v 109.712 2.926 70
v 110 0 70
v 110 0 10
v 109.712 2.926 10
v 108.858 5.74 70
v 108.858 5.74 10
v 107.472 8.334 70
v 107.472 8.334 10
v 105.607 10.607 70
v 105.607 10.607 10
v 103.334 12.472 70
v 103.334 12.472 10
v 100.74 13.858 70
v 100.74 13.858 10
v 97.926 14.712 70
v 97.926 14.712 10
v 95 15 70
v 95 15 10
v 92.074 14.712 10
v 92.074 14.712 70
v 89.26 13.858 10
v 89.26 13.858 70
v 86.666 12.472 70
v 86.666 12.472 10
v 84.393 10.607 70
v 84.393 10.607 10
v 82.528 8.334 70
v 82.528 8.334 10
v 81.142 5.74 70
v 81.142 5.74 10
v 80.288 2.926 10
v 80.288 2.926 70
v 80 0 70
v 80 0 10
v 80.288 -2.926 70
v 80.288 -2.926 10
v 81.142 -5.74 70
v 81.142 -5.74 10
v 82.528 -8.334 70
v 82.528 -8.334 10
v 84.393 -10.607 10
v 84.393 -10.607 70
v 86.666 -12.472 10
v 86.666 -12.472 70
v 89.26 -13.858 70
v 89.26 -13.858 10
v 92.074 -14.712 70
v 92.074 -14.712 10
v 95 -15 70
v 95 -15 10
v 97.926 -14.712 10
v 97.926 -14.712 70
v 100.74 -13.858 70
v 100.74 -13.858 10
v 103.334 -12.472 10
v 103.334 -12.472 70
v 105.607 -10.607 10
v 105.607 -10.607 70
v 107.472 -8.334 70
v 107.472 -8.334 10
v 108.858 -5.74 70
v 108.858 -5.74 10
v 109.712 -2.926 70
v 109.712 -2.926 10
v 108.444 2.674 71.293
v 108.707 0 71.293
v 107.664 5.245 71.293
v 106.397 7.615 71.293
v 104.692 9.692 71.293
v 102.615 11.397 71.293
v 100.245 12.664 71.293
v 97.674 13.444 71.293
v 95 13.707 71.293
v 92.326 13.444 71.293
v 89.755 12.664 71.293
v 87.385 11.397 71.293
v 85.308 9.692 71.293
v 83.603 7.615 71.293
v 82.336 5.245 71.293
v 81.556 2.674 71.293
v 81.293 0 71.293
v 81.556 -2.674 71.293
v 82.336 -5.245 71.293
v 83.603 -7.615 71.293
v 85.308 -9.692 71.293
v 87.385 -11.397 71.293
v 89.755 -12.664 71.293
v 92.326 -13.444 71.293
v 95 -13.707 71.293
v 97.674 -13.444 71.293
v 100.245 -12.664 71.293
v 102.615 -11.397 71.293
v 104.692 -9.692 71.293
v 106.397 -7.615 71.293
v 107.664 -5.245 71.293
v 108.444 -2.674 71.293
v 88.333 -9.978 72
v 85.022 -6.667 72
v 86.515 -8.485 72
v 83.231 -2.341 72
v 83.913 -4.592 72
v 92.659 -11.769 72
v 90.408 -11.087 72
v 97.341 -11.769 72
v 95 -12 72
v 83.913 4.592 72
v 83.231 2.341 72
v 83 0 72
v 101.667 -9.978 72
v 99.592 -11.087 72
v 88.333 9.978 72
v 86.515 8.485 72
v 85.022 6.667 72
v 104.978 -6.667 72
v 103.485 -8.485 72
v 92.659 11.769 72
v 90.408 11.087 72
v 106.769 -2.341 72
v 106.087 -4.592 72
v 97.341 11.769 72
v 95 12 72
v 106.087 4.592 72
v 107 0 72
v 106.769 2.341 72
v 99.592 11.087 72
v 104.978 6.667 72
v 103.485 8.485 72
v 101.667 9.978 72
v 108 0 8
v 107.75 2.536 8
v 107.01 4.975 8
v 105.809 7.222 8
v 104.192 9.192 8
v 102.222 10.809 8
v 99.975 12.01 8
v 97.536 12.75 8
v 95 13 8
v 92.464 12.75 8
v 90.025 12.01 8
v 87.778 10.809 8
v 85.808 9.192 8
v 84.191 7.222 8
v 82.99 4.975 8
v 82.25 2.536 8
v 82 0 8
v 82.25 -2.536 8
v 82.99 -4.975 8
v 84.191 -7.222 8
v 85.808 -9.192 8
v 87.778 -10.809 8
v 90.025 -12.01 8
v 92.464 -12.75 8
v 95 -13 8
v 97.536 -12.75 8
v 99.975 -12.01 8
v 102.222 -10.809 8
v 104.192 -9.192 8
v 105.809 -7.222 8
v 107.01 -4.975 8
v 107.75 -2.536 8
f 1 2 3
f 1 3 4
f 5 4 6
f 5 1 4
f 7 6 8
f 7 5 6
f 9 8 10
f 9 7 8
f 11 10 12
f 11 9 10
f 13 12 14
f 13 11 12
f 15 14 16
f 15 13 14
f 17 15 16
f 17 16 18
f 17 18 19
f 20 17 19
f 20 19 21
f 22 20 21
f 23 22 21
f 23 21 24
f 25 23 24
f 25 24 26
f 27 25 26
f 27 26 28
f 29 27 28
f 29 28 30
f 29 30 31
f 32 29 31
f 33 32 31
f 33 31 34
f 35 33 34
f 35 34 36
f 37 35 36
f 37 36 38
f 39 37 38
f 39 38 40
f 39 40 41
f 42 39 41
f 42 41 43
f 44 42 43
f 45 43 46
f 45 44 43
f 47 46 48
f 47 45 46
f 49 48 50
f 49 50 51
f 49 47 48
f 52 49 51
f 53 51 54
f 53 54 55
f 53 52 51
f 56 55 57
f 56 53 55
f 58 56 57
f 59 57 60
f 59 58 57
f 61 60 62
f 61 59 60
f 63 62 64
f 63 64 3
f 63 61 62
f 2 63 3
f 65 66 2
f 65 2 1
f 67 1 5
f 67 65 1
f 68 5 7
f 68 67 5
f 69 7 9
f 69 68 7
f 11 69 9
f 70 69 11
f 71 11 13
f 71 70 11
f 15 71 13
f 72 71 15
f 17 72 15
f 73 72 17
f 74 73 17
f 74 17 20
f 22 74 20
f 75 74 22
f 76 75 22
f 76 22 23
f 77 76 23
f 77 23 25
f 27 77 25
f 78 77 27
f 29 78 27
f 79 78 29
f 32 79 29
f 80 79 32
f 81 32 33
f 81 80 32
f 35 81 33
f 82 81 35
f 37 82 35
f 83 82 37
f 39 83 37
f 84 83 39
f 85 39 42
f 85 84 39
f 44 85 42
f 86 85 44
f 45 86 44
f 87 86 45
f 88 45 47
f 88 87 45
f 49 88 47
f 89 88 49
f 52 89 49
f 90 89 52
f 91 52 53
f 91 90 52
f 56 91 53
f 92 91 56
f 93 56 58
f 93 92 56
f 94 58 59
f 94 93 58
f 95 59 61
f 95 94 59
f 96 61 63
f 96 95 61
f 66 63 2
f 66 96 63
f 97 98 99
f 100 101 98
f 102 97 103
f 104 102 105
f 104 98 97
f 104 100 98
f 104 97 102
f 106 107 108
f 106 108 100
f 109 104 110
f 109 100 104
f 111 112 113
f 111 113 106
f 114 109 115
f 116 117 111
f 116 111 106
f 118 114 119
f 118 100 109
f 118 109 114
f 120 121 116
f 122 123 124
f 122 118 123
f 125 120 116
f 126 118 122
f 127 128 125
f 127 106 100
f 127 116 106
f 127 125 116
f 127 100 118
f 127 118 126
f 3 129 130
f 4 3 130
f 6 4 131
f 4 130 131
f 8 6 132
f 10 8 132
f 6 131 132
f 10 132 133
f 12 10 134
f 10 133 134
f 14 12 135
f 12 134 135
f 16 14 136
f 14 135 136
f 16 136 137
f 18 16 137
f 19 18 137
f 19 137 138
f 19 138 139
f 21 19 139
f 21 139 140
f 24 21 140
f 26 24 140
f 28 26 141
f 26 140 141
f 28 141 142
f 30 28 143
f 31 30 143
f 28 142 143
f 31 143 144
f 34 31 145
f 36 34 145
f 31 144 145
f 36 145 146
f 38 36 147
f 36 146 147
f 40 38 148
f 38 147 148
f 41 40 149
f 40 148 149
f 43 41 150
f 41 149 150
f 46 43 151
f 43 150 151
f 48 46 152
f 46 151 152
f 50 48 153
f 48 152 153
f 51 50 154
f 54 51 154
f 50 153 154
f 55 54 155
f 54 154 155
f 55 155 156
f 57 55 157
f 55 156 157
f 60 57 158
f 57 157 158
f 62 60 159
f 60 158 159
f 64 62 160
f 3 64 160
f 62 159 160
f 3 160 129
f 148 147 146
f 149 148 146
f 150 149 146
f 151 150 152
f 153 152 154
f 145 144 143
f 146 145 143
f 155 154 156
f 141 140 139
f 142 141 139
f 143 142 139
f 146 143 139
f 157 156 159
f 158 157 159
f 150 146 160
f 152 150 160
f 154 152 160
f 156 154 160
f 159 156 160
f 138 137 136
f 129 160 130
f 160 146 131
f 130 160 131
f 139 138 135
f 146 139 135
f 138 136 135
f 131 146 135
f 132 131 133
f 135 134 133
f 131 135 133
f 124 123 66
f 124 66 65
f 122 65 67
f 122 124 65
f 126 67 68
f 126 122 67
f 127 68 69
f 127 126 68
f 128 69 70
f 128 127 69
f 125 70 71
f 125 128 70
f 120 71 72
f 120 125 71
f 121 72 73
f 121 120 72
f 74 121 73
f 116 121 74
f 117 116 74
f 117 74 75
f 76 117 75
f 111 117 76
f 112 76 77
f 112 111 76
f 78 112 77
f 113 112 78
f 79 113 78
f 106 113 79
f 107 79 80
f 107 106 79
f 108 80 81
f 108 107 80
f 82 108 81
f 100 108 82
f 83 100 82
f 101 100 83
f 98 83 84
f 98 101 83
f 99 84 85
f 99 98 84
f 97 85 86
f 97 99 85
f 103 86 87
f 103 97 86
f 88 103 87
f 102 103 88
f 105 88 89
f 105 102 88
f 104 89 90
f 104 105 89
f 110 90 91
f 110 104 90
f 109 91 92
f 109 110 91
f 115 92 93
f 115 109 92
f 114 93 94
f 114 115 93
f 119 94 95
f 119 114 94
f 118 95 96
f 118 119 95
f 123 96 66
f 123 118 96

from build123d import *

# Parameters (mm, degrees)
F0_R     = 15
F1_DEPTH = 32
F2_SIZE  = 2
F3_SIZE  = 1


with BuildPart() as f1:
    # F0 (on Top) → F1 (new body, symmetric)
    with BuildSketch(Plane.XY):
        with Locations((95, 0)):
            Circle(F0_R)
    extrude(amount=F1_DEPTH, both=True)

    # F2
    f2_edges = [f1.edges().sort_by_distance(p)[0] for p in [
        (80, 0, 32),
        (80, 0, -32),
    ]]
    chamfer(f2_edges, length=F2_SIZE)

    # F3
    f3_edges = [f1.edges().sort_by_distance(p)[0] for p in [
        (82, 0, 32),
    ]]
    chamfer(f3_edges, length=F3_SIZE)


with BuildPart() as f1_1:
    # F4: moved
    add(f1.part.moved(Location((0, 0, 40))))


solid = f1_1.part
